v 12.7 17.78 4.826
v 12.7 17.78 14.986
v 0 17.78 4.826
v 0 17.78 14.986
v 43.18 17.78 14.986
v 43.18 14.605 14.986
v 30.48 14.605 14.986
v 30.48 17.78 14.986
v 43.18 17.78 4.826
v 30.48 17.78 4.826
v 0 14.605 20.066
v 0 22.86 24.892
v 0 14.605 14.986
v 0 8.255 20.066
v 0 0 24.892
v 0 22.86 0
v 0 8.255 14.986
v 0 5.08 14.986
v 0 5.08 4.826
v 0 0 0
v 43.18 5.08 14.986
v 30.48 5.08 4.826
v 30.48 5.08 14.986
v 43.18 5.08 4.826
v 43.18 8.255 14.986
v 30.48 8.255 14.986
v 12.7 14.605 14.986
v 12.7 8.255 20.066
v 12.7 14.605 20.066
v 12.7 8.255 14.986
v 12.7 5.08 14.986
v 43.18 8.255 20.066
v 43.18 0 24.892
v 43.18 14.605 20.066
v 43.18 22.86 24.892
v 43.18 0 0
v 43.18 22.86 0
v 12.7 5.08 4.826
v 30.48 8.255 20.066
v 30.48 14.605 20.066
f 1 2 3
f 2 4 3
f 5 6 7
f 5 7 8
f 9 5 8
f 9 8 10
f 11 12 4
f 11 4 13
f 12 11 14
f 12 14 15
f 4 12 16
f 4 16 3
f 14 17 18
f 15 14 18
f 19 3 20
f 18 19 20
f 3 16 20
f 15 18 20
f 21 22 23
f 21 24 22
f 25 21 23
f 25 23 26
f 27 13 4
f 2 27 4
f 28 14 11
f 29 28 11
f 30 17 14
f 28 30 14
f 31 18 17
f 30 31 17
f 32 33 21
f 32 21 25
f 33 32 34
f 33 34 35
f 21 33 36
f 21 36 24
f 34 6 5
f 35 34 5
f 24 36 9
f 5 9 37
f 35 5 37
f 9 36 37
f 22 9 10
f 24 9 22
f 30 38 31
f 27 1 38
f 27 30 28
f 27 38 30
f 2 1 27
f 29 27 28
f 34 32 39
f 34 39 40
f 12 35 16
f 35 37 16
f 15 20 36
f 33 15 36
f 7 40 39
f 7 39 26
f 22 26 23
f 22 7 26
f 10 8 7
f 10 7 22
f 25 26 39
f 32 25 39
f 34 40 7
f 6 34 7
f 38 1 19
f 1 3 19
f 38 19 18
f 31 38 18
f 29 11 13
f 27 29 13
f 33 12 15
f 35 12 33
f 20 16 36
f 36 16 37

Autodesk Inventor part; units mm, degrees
ref_plane "YZ Plane" through (0, 0, 0) normal (1, 0, 0) x (0, 1, 0)
ref_plane "XZ Plane" through (0, 0, 0) normal (0, 1, 0) x (-1, 0, 0)
ref_plane "XY Plane" through (0, 0, 0) normal (0, 0, 1) x (1, 0, 0)
sketch "Sketch1" plane through (0, 0, 0) normal (0, 0, 1) x (1, 0, 0)
  line L0 (0, 0) -> (43.18, 0)
  line L1 (43.18, 0) -> (43.18, 22.86)
  line L2 (43.18, 22.86) -> (0, 22.86)
  line L3 (0, 22.86) -> (0, 0)
  dimension "d0" = 43.18
  dimension "d1" = 22.86
extrude "Extrusion1" add sketch "Sketch1" along normal blind 24.892
sketch "Sketch2" plane through (43.18, 0, 0) normal (1, 0, 0) x (0, 0, -1)
  line L0 (-4.826, 5.08) -> (-14.986, 5.08)
  line L1 (-14.986, 5.08) -> (-14.986, 17.78)
  line L2 (-14.986, 17.78) -> (-4.826, 17.78)
  line L3 (-4.826, 17.78) -> (-4.826, 5.08)
  line L4 (-24.892, 0) -> (-24.892, 22.86) construction
  line L5 (-14.986, 8.255) -> (-20.066, 8.255)
  line L6 (-20.066, 8.255) -> (-20.066, 14.605)
  line L7 (-20.066, 14.605) -> (-14.986, 14.605)
  line L8 (-14.986, 14.605) -> (-14.986, 8.255)
  line L9 (-20.066, 17.78) -> (-4.826, 17.78)
  line L10 (0, 22.86) -> (-24.892, 22.86) construction
  point P0 (0, 0)
  point P1 (-14.986, 11.43)
  point P2 (-24.892, 11.43)
  point P3 (-20.066, 11.43)
  point P4 (-12.446, 17.78)
  point P5 (-12.446, 22.86)
  dimension "d4" = 10.16
  dimension "d5" = 12.7
  dimension "d6" = 5.08
  dimension "d7" = 6.35
extrude "Extrusion2" cut sketch "Sketch2" against normal blind 12.7
sketch "Sketch3" plane through (0, 0, 0) normal (-1, 0, 0) x (0, 0, 1)
  line L0 (14.986, 14.605) -> (14.986, 17.78) projected
  line L1 (20.066, 14.605) -> (14.986, 14.605) projected
  line L2 (20.066, 8.255) -> (20.066, 14.605) projected
  line L3 (14.986, 8.255) -> (20.066, 8.255) projected
  line L4 (4.826, 5.08) -> (14.986, 5.08) projected
  line L5 (4.826, 17.78) -> (4.826, 5.08) projected
  line L6 (14.986, 17.78) -> (4.826, 17.78) projected
  line L7 (14.986, 5.08) -> (14.986, 8.255) projected
  point P0 (0, 0)
extrude "Extrusion3" cut sketch "Sketch3" against normal blind 12.7
properties part number "Ethernet Port" material "ABS Plastic"
